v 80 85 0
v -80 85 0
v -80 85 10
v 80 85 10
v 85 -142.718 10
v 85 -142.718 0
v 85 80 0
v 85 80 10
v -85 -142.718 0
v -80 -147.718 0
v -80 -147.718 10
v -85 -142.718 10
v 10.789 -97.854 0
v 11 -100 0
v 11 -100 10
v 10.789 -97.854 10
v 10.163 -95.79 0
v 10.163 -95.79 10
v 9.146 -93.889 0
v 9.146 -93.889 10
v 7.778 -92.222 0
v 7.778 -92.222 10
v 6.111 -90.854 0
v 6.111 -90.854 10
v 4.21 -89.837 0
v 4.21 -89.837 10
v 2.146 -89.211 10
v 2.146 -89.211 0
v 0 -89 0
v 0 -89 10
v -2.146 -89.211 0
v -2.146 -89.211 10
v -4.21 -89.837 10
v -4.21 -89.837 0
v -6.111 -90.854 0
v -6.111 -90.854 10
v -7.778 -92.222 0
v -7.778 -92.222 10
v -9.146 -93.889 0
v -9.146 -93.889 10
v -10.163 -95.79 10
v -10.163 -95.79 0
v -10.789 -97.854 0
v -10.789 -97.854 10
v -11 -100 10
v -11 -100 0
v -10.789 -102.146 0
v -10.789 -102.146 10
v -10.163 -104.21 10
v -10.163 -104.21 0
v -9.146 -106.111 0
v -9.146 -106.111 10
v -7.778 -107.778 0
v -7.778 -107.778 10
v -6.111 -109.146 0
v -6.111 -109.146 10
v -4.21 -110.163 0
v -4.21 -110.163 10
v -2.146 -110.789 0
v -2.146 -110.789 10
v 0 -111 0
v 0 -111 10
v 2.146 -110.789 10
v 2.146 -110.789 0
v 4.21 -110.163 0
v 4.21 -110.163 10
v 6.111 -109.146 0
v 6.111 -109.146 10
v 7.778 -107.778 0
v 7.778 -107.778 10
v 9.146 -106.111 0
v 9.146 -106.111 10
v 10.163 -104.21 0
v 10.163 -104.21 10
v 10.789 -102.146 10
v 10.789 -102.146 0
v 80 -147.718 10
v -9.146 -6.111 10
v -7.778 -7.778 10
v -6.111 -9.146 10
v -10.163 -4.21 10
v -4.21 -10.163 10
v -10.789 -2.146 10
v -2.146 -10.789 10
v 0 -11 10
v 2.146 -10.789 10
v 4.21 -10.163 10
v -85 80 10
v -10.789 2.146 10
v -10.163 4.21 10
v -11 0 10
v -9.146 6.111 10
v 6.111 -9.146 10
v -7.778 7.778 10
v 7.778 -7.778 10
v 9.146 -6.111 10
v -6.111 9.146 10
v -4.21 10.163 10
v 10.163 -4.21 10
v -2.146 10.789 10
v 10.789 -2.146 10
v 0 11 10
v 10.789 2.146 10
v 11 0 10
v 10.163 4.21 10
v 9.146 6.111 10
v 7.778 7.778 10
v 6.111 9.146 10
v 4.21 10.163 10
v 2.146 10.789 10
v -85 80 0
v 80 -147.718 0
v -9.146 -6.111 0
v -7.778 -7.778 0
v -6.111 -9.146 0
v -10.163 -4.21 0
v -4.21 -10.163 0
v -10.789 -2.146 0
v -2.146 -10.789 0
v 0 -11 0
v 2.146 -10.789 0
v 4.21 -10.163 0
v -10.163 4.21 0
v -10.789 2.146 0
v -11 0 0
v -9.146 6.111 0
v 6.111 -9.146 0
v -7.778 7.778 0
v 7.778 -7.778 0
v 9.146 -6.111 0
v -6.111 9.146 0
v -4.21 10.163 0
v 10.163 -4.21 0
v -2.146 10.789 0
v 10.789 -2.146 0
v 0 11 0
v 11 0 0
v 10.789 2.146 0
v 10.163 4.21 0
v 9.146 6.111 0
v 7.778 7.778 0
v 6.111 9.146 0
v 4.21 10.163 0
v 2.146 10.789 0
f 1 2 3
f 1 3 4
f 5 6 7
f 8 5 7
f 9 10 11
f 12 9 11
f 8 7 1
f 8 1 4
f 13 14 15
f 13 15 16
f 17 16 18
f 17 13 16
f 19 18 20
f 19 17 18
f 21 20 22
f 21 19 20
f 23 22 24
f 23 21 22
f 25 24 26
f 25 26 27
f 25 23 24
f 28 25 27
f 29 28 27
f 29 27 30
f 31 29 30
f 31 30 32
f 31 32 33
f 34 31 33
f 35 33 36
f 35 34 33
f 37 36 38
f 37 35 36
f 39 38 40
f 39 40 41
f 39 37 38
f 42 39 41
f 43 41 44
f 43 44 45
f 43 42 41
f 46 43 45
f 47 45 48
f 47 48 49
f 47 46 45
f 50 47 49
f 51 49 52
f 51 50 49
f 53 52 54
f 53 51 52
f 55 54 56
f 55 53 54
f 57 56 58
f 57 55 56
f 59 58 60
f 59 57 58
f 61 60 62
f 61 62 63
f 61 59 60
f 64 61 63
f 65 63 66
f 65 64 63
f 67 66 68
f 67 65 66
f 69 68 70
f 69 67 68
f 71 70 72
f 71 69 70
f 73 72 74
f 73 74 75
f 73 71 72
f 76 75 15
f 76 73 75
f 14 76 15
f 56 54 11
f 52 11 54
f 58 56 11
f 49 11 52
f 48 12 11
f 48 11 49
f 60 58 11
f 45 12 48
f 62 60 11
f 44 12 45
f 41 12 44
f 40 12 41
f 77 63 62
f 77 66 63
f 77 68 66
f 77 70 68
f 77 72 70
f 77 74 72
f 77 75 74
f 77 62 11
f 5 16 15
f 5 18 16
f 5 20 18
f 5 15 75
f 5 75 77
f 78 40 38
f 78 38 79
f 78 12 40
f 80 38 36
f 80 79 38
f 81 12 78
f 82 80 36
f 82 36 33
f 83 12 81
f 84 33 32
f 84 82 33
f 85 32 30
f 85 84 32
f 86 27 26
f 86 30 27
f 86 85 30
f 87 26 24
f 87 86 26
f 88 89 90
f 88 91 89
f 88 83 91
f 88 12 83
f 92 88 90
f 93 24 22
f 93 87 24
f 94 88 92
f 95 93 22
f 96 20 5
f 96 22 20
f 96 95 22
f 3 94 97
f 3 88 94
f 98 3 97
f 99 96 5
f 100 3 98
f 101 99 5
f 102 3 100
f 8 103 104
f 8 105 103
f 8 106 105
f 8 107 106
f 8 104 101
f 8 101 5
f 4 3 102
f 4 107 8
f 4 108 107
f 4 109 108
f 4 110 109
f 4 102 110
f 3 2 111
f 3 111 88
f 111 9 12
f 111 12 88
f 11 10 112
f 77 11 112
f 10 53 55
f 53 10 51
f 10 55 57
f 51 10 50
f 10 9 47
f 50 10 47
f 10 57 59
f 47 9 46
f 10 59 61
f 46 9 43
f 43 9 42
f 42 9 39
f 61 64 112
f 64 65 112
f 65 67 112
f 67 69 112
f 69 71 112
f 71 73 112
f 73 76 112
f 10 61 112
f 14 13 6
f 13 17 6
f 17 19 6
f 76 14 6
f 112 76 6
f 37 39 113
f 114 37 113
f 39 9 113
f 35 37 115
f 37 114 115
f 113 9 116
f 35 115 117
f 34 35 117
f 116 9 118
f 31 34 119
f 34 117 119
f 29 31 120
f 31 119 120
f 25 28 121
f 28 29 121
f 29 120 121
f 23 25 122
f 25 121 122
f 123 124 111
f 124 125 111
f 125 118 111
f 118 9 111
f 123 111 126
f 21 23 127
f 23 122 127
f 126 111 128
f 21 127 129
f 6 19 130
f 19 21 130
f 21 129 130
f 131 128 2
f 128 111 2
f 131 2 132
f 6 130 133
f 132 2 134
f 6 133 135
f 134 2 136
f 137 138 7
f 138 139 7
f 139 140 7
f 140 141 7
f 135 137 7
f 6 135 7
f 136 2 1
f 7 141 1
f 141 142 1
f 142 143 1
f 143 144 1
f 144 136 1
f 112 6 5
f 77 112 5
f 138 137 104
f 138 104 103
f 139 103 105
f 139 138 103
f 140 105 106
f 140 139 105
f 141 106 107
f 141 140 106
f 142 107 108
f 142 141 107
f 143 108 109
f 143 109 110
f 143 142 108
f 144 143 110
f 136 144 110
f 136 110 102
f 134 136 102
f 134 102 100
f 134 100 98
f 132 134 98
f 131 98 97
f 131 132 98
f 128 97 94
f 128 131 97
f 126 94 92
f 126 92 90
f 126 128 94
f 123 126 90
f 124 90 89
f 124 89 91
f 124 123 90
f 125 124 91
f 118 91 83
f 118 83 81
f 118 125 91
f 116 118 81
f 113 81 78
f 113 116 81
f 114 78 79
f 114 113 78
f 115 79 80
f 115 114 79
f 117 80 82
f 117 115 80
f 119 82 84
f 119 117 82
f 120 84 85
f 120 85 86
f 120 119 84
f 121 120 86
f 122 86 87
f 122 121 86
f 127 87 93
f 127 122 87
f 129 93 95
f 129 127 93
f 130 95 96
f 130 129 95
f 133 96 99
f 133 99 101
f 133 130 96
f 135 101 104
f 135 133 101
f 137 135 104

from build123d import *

# Parameters (mm, degrees)
SKETCH1_W           = 170
SKETCH1_H           = 232.717889213
SKETCH1_R           = 11
BOSS_EXTRUDE1_DEPTH = 10
CHAMFER1_SIZE       = 5


with BuildPart() as part:
    # Sketch1 → Boss-Extrude1 (new body)
    with BuildSketch(Plane.XY):
        with Locations((0, -31.358944607)):
            Rectangle(SKETCH1_W, SKETCH1_H)
        Circle(SKETCH1_R, mode=Mode.SUBTRACT)
        with Locations((0, -100)):
            Circle(SKETCH1_R, mode=Mode.SUBTRACT)
    extrude(amount=BOSS_EXTRUDE1_DEPTH)

    # Chamfer1
    chamfer1_edges = [part.edges().sort_by_distance(p)[0] for p in [
        (-85, 85, 5),
        (85, 85, 5),
        (85, -147.717889213, 5),
        (-85, -147.717889213, 5),
    ]]
    chamfer(chamfer1_edges, length=CHAMFER1_SIZE)


solid = part.part
